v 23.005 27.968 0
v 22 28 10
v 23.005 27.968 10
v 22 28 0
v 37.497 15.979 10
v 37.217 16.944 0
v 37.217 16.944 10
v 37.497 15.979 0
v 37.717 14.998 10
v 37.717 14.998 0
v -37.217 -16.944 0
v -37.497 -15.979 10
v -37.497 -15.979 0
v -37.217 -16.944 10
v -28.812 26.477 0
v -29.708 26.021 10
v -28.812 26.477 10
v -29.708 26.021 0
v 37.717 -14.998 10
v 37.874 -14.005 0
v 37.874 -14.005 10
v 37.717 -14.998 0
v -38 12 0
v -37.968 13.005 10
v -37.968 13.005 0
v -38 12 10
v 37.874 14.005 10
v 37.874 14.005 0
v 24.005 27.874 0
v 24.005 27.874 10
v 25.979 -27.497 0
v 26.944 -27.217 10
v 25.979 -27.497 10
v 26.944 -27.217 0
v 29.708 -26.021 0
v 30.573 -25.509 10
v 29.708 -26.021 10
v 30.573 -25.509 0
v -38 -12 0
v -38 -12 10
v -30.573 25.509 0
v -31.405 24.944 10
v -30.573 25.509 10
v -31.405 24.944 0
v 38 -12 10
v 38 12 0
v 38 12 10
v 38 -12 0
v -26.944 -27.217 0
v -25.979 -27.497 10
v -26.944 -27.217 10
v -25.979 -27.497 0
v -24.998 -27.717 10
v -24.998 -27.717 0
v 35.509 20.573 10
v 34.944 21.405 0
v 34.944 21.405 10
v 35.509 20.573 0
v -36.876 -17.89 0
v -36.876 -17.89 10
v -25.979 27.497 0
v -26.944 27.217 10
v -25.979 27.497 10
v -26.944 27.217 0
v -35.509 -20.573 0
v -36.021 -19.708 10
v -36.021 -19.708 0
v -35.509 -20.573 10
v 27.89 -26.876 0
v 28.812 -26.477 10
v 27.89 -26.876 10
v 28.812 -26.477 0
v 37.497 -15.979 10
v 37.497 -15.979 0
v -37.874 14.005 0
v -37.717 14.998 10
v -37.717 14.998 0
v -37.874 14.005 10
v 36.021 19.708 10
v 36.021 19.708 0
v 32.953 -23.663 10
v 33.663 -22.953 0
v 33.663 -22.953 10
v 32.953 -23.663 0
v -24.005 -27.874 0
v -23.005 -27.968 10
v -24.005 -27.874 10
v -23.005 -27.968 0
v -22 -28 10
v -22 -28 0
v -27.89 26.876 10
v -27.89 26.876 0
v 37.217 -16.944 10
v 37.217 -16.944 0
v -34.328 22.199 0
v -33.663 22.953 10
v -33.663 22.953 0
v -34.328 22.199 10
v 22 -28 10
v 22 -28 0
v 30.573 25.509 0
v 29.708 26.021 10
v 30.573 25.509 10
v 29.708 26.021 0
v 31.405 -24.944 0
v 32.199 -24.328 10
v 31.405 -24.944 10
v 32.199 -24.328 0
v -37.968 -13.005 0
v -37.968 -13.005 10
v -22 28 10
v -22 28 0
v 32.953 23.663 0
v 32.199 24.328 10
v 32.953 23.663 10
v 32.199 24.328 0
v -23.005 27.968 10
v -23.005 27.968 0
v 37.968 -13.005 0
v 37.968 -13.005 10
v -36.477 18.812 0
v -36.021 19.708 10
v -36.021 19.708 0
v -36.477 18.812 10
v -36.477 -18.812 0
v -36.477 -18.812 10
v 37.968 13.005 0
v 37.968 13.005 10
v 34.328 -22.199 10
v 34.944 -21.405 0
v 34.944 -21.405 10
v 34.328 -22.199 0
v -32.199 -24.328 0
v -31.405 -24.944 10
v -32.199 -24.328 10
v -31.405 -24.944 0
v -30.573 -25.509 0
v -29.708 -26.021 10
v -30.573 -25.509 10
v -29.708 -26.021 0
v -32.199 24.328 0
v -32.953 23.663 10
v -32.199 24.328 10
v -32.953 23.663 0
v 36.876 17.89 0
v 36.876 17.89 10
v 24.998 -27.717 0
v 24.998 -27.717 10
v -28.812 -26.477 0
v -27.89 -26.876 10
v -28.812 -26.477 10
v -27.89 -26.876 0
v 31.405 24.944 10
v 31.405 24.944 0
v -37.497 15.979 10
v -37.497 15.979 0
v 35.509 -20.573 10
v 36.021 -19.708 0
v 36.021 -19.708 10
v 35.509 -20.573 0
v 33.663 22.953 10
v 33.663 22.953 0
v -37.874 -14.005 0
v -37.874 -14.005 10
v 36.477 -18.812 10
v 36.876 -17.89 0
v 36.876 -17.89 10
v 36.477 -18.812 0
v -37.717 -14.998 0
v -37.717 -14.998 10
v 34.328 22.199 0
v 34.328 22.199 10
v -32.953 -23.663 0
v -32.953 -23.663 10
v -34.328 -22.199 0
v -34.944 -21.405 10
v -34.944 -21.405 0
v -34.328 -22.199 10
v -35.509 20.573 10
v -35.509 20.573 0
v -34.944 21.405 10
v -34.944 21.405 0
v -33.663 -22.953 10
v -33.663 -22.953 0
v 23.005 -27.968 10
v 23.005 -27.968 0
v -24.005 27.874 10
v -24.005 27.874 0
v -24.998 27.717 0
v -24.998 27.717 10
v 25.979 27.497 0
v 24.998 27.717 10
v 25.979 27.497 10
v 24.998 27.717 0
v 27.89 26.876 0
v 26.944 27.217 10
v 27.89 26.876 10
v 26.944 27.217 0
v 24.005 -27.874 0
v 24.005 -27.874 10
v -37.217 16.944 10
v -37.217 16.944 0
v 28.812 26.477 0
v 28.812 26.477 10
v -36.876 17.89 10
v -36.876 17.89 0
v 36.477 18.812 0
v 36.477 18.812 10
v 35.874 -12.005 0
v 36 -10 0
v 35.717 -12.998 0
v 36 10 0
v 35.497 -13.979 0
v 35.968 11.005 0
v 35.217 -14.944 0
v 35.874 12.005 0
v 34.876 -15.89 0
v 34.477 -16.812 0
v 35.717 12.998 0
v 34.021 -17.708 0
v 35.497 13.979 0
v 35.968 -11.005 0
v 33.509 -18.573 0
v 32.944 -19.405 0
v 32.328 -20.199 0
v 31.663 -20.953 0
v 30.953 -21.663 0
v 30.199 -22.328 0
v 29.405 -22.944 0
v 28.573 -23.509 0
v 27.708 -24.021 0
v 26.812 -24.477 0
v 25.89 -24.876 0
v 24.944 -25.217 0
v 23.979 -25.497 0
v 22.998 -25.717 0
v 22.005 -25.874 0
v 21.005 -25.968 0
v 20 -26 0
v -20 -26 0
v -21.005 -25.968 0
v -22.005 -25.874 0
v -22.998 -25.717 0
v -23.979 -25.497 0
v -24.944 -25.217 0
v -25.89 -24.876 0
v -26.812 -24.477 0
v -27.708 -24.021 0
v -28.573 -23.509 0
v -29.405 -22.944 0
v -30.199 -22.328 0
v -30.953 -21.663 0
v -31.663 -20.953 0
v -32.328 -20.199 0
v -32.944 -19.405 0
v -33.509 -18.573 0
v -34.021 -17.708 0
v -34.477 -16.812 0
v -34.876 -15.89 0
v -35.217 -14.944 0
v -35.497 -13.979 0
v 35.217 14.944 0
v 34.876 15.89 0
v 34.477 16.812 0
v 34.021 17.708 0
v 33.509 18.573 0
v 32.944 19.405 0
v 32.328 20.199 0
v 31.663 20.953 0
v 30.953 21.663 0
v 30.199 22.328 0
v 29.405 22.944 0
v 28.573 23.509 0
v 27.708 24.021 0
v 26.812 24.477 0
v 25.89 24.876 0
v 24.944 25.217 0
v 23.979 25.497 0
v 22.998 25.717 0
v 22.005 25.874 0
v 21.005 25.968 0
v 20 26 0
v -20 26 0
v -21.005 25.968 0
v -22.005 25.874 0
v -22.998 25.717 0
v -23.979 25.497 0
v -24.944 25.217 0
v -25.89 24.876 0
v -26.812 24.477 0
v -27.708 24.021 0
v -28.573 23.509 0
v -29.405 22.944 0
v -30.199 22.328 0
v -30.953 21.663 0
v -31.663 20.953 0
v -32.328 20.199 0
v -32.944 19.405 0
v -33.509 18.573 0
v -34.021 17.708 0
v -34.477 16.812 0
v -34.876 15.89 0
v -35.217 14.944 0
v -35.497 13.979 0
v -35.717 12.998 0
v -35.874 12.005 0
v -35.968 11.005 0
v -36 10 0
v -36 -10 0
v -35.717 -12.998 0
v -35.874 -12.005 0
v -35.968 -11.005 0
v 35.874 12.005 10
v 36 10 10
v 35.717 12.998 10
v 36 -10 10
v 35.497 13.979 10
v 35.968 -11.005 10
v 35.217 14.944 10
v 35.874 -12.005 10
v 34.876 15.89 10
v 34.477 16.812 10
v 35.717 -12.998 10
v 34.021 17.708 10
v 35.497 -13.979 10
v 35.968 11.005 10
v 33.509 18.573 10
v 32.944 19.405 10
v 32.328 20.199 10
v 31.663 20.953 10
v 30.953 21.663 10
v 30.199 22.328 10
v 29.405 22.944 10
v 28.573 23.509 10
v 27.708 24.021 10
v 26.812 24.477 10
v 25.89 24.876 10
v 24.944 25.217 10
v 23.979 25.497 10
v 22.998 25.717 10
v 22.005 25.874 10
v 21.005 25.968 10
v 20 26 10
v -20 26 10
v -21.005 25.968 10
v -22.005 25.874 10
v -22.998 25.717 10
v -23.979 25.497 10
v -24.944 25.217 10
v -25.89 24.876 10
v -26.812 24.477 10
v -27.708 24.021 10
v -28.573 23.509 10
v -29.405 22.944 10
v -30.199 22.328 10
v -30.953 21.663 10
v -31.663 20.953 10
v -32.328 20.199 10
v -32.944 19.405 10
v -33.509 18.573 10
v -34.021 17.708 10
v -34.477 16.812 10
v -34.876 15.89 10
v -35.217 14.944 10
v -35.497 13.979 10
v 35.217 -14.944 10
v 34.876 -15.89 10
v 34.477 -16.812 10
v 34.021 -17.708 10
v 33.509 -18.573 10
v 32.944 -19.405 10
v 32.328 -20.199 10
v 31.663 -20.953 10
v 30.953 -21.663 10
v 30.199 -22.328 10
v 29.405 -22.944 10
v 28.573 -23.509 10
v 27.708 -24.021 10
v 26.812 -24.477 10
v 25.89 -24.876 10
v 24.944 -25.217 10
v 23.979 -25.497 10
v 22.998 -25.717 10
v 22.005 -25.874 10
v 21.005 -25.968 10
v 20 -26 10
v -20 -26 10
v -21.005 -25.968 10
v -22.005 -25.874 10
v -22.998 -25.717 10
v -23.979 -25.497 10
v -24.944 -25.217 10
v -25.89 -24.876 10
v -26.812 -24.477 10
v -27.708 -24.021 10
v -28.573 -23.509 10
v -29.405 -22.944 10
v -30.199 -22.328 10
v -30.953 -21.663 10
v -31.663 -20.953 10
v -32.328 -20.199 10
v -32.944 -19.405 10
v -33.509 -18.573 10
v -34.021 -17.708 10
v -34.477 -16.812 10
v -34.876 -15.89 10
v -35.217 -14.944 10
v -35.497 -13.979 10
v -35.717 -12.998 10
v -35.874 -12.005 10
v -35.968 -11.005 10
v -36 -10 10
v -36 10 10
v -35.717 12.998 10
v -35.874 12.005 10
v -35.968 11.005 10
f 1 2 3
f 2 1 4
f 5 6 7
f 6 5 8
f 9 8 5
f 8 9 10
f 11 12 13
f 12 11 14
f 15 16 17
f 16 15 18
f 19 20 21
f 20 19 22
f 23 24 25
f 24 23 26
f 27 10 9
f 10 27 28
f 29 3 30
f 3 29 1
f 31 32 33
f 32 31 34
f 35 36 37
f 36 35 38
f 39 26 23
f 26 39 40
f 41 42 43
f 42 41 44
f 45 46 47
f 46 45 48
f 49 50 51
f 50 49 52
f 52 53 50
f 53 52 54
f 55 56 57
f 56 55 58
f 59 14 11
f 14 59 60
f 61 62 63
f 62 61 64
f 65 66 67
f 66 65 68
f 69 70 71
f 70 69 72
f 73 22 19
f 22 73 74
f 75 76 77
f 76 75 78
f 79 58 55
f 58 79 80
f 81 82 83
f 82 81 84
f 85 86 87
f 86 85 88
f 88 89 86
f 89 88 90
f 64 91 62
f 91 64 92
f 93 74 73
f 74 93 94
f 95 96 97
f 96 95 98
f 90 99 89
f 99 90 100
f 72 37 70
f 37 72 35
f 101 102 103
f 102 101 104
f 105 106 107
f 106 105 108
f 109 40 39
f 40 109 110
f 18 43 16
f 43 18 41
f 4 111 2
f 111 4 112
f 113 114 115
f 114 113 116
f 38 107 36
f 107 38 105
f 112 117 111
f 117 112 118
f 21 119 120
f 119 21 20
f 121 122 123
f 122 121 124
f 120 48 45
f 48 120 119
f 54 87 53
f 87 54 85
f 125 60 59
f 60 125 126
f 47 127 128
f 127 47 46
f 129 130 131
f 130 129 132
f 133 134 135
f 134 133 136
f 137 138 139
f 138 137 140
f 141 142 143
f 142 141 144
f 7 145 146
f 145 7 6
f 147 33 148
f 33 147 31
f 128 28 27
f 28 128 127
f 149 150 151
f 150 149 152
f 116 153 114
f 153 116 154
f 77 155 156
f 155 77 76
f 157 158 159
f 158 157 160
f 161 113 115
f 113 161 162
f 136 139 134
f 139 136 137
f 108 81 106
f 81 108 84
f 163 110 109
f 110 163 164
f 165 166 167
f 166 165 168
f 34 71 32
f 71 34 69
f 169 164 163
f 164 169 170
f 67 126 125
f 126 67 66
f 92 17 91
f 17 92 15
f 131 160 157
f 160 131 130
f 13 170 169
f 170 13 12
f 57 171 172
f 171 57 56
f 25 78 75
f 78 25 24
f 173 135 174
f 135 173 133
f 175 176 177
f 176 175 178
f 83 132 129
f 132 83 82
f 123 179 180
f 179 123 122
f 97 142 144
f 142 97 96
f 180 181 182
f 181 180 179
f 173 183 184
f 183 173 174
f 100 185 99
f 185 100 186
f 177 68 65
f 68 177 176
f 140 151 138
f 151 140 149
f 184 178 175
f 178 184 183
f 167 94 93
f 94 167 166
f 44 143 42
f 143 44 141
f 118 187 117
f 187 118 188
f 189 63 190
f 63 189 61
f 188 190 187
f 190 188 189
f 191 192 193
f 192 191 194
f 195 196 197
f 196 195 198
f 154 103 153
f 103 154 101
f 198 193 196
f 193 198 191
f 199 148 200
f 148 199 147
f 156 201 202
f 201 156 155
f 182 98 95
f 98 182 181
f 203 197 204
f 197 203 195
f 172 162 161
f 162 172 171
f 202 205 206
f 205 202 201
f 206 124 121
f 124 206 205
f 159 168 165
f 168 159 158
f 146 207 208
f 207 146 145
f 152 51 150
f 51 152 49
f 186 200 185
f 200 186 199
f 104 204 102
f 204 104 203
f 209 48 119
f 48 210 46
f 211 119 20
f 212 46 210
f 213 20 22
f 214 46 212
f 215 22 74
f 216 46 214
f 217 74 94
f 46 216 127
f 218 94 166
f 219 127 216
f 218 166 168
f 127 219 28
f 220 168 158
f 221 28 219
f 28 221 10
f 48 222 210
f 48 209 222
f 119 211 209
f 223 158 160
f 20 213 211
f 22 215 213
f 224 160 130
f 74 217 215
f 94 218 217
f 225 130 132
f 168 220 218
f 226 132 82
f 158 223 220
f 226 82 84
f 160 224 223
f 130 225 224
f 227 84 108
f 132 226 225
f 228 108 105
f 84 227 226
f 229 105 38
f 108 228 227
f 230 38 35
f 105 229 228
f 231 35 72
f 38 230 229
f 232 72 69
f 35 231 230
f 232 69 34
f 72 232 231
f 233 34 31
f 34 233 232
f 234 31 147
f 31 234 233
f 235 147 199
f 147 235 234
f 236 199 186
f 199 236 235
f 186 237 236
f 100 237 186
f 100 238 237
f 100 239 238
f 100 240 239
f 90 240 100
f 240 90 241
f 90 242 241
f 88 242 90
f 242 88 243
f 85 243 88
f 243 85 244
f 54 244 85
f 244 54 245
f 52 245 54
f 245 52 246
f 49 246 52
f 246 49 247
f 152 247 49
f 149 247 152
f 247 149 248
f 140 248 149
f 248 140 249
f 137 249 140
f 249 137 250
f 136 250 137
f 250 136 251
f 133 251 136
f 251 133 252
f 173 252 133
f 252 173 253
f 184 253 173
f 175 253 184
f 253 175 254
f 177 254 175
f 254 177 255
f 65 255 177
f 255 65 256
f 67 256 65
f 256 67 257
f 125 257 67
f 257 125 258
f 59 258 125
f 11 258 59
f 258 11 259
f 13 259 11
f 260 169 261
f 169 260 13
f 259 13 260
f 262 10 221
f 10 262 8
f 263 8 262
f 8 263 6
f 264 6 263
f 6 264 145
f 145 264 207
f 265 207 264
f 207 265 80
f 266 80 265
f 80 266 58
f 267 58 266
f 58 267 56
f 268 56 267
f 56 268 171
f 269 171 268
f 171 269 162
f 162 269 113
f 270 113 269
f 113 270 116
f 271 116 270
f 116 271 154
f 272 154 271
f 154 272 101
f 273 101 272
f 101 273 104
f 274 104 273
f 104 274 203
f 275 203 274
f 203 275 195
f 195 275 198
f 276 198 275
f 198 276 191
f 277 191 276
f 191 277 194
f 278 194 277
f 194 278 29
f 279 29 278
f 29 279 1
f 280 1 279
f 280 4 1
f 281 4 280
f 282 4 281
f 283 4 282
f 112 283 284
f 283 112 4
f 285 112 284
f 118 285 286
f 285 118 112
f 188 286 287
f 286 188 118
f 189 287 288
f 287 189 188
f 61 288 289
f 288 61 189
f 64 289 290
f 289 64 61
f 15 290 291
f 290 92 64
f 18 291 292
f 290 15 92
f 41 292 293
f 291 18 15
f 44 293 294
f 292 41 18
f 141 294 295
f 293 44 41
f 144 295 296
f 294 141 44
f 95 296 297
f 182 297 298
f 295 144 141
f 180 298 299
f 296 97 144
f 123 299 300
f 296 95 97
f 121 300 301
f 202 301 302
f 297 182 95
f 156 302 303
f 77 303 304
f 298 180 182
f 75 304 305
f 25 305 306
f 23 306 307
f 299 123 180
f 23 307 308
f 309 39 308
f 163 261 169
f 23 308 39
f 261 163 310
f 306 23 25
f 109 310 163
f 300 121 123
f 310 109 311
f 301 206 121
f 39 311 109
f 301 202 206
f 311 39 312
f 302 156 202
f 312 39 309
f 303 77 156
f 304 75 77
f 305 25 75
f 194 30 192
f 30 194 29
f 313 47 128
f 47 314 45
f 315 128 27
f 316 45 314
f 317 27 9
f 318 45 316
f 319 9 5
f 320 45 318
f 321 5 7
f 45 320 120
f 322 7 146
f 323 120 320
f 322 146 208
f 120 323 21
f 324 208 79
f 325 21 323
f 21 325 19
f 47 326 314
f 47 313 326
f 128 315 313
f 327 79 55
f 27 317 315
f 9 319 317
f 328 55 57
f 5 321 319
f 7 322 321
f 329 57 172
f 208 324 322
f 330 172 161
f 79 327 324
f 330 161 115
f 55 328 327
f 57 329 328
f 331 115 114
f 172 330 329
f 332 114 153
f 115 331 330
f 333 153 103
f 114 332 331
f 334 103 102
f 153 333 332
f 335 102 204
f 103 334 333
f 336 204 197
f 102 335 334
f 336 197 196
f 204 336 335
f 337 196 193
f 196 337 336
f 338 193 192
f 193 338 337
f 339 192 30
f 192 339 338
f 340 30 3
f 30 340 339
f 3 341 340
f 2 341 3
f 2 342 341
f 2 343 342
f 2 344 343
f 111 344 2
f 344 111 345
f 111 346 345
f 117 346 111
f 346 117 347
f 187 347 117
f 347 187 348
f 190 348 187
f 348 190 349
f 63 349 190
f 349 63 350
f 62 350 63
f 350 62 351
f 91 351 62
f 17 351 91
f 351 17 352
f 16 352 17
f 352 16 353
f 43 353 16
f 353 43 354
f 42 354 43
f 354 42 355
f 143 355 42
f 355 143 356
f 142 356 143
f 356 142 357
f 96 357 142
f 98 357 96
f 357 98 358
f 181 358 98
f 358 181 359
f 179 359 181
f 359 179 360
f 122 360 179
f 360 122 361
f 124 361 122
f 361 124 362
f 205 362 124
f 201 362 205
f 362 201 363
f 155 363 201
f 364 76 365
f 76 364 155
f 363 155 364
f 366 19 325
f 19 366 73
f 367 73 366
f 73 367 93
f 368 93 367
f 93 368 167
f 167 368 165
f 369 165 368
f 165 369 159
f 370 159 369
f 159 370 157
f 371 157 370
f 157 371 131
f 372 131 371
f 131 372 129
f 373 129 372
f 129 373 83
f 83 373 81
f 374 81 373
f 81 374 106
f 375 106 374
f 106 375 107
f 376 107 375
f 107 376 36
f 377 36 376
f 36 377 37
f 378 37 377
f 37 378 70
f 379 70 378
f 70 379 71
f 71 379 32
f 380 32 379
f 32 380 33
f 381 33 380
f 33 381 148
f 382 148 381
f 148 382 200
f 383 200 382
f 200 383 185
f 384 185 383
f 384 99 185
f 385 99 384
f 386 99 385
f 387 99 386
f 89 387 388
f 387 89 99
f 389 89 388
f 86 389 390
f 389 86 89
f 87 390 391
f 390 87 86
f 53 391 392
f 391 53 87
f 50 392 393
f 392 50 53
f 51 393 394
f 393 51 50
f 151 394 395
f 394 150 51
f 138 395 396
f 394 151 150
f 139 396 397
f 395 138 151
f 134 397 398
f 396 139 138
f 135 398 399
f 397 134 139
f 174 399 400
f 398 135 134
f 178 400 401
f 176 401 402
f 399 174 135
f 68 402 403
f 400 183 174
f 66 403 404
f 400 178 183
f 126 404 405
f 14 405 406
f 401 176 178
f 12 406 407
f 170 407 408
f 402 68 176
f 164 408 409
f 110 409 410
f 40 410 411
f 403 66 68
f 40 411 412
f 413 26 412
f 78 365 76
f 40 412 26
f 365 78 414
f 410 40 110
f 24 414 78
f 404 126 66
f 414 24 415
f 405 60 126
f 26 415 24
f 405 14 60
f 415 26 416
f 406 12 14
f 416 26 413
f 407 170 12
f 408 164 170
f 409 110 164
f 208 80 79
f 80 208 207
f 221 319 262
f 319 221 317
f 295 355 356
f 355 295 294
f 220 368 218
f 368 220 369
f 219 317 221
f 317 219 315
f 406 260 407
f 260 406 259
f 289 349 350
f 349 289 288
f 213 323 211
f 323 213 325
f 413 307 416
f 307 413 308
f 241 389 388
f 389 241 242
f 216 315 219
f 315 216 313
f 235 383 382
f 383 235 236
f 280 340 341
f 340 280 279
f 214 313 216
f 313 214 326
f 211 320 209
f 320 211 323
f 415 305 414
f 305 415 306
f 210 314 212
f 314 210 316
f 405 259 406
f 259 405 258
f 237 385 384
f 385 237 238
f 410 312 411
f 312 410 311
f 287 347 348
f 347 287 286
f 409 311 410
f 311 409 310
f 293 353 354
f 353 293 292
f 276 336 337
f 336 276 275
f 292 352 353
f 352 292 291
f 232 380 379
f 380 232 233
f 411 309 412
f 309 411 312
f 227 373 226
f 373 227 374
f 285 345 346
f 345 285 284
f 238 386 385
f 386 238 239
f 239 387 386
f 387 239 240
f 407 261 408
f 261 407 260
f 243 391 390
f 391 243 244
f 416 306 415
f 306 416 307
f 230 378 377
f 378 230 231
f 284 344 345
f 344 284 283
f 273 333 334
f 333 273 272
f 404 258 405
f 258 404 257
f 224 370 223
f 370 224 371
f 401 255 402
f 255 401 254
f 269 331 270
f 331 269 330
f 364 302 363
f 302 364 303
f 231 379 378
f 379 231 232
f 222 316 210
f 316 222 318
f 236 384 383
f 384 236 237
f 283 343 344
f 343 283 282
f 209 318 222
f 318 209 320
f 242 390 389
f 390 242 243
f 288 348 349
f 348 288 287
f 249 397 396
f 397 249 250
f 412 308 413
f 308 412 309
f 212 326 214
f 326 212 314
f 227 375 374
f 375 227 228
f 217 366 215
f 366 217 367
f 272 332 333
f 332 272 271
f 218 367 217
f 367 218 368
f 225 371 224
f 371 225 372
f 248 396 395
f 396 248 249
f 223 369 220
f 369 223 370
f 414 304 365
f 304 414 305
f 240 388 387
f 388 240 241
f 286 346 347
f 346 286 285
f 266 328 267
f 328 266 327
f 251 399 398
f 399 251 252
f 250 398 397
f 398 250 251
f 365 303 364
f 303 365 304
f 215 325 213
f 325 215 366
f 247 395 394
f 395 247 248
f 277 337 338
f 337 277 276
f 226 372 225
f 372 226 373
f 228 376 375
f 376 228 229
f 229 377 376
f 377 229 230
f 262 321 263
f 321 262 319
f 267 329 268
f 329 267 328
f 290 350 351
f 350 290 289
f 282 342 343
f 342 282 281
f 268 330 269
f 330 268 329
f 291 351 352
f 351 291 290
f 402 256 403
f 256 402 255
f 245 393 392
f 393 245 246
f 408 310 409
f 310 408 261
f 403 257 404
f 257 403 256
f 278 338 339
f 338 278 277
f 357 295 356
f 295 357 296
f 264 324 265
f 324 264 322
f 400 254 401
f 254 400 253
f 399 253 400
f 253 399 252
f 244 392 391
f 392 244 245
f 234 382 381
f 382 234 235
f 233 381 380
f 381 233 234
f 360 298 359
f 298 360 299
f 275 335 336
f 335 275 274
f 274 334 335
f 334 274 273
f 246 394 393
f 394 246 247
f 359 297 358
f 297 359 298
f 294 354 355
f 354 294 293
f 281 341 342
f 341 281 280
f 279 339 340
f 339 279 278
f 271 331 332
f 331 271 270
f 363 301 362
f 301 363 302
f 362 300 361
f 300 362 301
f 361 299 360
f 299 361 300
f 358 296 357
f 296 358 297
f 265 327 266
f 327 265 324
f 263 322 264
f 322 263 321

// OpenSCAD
/*
Description : 
    Creates clamp-bands for inside open downspout.
    These hold things like rubber or screens.
*/

/*****************************************************************************
CONSTANTS
*****************************************************************************/
//$fs = 0.01;
//$fa = 0.01;
$fn = 100;
minkowski_circle = 16;
wallThickness = 4;

outerwidth1 = 78;
outerheight1 = 58;
height1 = 110;
wallThickness1 = wallThickness;

outerwidth2 = 76 - minkowski_circle;
outerheight2 = 56 - minkowski_circle;
height2 = 100;
wallThickness2 = wallThickness;



squareTube(outerwidth2,outerheight2,wallThickness2,10);

module squareTube(outerwidth, outerheight, wallThickness, height)
{
    difference()
    {
        echo(width = outerwidth-minkowski_circle, height = outerheight-minkowski_circle);
        linear_extrude(height,true)
        minkowski()
        {
        square([outerwidth-minkowski_circle, outerheight-minkowski_circle],true);
            circle(minkowski_circle);
        }
        
        translate([0,0,-2])
        linear_extrude(height+4,true)
        minkowski()
        {
        square([outerwidth-wallThickness-minkowski_circle,outerheight-wallThickness-minkowski_circle],true);
                        circle(minkowski_circle);
        }
    }
}

module solidTube(outerwidth, outerheight, wallThickness, height)
{
    linear_extrude(height,true)
    minkowski()
    {
        square([outerwidth-minkowski_circle, outerheight-minkowski_circle],true);
        circle(minkowski_circle);
    }
}
